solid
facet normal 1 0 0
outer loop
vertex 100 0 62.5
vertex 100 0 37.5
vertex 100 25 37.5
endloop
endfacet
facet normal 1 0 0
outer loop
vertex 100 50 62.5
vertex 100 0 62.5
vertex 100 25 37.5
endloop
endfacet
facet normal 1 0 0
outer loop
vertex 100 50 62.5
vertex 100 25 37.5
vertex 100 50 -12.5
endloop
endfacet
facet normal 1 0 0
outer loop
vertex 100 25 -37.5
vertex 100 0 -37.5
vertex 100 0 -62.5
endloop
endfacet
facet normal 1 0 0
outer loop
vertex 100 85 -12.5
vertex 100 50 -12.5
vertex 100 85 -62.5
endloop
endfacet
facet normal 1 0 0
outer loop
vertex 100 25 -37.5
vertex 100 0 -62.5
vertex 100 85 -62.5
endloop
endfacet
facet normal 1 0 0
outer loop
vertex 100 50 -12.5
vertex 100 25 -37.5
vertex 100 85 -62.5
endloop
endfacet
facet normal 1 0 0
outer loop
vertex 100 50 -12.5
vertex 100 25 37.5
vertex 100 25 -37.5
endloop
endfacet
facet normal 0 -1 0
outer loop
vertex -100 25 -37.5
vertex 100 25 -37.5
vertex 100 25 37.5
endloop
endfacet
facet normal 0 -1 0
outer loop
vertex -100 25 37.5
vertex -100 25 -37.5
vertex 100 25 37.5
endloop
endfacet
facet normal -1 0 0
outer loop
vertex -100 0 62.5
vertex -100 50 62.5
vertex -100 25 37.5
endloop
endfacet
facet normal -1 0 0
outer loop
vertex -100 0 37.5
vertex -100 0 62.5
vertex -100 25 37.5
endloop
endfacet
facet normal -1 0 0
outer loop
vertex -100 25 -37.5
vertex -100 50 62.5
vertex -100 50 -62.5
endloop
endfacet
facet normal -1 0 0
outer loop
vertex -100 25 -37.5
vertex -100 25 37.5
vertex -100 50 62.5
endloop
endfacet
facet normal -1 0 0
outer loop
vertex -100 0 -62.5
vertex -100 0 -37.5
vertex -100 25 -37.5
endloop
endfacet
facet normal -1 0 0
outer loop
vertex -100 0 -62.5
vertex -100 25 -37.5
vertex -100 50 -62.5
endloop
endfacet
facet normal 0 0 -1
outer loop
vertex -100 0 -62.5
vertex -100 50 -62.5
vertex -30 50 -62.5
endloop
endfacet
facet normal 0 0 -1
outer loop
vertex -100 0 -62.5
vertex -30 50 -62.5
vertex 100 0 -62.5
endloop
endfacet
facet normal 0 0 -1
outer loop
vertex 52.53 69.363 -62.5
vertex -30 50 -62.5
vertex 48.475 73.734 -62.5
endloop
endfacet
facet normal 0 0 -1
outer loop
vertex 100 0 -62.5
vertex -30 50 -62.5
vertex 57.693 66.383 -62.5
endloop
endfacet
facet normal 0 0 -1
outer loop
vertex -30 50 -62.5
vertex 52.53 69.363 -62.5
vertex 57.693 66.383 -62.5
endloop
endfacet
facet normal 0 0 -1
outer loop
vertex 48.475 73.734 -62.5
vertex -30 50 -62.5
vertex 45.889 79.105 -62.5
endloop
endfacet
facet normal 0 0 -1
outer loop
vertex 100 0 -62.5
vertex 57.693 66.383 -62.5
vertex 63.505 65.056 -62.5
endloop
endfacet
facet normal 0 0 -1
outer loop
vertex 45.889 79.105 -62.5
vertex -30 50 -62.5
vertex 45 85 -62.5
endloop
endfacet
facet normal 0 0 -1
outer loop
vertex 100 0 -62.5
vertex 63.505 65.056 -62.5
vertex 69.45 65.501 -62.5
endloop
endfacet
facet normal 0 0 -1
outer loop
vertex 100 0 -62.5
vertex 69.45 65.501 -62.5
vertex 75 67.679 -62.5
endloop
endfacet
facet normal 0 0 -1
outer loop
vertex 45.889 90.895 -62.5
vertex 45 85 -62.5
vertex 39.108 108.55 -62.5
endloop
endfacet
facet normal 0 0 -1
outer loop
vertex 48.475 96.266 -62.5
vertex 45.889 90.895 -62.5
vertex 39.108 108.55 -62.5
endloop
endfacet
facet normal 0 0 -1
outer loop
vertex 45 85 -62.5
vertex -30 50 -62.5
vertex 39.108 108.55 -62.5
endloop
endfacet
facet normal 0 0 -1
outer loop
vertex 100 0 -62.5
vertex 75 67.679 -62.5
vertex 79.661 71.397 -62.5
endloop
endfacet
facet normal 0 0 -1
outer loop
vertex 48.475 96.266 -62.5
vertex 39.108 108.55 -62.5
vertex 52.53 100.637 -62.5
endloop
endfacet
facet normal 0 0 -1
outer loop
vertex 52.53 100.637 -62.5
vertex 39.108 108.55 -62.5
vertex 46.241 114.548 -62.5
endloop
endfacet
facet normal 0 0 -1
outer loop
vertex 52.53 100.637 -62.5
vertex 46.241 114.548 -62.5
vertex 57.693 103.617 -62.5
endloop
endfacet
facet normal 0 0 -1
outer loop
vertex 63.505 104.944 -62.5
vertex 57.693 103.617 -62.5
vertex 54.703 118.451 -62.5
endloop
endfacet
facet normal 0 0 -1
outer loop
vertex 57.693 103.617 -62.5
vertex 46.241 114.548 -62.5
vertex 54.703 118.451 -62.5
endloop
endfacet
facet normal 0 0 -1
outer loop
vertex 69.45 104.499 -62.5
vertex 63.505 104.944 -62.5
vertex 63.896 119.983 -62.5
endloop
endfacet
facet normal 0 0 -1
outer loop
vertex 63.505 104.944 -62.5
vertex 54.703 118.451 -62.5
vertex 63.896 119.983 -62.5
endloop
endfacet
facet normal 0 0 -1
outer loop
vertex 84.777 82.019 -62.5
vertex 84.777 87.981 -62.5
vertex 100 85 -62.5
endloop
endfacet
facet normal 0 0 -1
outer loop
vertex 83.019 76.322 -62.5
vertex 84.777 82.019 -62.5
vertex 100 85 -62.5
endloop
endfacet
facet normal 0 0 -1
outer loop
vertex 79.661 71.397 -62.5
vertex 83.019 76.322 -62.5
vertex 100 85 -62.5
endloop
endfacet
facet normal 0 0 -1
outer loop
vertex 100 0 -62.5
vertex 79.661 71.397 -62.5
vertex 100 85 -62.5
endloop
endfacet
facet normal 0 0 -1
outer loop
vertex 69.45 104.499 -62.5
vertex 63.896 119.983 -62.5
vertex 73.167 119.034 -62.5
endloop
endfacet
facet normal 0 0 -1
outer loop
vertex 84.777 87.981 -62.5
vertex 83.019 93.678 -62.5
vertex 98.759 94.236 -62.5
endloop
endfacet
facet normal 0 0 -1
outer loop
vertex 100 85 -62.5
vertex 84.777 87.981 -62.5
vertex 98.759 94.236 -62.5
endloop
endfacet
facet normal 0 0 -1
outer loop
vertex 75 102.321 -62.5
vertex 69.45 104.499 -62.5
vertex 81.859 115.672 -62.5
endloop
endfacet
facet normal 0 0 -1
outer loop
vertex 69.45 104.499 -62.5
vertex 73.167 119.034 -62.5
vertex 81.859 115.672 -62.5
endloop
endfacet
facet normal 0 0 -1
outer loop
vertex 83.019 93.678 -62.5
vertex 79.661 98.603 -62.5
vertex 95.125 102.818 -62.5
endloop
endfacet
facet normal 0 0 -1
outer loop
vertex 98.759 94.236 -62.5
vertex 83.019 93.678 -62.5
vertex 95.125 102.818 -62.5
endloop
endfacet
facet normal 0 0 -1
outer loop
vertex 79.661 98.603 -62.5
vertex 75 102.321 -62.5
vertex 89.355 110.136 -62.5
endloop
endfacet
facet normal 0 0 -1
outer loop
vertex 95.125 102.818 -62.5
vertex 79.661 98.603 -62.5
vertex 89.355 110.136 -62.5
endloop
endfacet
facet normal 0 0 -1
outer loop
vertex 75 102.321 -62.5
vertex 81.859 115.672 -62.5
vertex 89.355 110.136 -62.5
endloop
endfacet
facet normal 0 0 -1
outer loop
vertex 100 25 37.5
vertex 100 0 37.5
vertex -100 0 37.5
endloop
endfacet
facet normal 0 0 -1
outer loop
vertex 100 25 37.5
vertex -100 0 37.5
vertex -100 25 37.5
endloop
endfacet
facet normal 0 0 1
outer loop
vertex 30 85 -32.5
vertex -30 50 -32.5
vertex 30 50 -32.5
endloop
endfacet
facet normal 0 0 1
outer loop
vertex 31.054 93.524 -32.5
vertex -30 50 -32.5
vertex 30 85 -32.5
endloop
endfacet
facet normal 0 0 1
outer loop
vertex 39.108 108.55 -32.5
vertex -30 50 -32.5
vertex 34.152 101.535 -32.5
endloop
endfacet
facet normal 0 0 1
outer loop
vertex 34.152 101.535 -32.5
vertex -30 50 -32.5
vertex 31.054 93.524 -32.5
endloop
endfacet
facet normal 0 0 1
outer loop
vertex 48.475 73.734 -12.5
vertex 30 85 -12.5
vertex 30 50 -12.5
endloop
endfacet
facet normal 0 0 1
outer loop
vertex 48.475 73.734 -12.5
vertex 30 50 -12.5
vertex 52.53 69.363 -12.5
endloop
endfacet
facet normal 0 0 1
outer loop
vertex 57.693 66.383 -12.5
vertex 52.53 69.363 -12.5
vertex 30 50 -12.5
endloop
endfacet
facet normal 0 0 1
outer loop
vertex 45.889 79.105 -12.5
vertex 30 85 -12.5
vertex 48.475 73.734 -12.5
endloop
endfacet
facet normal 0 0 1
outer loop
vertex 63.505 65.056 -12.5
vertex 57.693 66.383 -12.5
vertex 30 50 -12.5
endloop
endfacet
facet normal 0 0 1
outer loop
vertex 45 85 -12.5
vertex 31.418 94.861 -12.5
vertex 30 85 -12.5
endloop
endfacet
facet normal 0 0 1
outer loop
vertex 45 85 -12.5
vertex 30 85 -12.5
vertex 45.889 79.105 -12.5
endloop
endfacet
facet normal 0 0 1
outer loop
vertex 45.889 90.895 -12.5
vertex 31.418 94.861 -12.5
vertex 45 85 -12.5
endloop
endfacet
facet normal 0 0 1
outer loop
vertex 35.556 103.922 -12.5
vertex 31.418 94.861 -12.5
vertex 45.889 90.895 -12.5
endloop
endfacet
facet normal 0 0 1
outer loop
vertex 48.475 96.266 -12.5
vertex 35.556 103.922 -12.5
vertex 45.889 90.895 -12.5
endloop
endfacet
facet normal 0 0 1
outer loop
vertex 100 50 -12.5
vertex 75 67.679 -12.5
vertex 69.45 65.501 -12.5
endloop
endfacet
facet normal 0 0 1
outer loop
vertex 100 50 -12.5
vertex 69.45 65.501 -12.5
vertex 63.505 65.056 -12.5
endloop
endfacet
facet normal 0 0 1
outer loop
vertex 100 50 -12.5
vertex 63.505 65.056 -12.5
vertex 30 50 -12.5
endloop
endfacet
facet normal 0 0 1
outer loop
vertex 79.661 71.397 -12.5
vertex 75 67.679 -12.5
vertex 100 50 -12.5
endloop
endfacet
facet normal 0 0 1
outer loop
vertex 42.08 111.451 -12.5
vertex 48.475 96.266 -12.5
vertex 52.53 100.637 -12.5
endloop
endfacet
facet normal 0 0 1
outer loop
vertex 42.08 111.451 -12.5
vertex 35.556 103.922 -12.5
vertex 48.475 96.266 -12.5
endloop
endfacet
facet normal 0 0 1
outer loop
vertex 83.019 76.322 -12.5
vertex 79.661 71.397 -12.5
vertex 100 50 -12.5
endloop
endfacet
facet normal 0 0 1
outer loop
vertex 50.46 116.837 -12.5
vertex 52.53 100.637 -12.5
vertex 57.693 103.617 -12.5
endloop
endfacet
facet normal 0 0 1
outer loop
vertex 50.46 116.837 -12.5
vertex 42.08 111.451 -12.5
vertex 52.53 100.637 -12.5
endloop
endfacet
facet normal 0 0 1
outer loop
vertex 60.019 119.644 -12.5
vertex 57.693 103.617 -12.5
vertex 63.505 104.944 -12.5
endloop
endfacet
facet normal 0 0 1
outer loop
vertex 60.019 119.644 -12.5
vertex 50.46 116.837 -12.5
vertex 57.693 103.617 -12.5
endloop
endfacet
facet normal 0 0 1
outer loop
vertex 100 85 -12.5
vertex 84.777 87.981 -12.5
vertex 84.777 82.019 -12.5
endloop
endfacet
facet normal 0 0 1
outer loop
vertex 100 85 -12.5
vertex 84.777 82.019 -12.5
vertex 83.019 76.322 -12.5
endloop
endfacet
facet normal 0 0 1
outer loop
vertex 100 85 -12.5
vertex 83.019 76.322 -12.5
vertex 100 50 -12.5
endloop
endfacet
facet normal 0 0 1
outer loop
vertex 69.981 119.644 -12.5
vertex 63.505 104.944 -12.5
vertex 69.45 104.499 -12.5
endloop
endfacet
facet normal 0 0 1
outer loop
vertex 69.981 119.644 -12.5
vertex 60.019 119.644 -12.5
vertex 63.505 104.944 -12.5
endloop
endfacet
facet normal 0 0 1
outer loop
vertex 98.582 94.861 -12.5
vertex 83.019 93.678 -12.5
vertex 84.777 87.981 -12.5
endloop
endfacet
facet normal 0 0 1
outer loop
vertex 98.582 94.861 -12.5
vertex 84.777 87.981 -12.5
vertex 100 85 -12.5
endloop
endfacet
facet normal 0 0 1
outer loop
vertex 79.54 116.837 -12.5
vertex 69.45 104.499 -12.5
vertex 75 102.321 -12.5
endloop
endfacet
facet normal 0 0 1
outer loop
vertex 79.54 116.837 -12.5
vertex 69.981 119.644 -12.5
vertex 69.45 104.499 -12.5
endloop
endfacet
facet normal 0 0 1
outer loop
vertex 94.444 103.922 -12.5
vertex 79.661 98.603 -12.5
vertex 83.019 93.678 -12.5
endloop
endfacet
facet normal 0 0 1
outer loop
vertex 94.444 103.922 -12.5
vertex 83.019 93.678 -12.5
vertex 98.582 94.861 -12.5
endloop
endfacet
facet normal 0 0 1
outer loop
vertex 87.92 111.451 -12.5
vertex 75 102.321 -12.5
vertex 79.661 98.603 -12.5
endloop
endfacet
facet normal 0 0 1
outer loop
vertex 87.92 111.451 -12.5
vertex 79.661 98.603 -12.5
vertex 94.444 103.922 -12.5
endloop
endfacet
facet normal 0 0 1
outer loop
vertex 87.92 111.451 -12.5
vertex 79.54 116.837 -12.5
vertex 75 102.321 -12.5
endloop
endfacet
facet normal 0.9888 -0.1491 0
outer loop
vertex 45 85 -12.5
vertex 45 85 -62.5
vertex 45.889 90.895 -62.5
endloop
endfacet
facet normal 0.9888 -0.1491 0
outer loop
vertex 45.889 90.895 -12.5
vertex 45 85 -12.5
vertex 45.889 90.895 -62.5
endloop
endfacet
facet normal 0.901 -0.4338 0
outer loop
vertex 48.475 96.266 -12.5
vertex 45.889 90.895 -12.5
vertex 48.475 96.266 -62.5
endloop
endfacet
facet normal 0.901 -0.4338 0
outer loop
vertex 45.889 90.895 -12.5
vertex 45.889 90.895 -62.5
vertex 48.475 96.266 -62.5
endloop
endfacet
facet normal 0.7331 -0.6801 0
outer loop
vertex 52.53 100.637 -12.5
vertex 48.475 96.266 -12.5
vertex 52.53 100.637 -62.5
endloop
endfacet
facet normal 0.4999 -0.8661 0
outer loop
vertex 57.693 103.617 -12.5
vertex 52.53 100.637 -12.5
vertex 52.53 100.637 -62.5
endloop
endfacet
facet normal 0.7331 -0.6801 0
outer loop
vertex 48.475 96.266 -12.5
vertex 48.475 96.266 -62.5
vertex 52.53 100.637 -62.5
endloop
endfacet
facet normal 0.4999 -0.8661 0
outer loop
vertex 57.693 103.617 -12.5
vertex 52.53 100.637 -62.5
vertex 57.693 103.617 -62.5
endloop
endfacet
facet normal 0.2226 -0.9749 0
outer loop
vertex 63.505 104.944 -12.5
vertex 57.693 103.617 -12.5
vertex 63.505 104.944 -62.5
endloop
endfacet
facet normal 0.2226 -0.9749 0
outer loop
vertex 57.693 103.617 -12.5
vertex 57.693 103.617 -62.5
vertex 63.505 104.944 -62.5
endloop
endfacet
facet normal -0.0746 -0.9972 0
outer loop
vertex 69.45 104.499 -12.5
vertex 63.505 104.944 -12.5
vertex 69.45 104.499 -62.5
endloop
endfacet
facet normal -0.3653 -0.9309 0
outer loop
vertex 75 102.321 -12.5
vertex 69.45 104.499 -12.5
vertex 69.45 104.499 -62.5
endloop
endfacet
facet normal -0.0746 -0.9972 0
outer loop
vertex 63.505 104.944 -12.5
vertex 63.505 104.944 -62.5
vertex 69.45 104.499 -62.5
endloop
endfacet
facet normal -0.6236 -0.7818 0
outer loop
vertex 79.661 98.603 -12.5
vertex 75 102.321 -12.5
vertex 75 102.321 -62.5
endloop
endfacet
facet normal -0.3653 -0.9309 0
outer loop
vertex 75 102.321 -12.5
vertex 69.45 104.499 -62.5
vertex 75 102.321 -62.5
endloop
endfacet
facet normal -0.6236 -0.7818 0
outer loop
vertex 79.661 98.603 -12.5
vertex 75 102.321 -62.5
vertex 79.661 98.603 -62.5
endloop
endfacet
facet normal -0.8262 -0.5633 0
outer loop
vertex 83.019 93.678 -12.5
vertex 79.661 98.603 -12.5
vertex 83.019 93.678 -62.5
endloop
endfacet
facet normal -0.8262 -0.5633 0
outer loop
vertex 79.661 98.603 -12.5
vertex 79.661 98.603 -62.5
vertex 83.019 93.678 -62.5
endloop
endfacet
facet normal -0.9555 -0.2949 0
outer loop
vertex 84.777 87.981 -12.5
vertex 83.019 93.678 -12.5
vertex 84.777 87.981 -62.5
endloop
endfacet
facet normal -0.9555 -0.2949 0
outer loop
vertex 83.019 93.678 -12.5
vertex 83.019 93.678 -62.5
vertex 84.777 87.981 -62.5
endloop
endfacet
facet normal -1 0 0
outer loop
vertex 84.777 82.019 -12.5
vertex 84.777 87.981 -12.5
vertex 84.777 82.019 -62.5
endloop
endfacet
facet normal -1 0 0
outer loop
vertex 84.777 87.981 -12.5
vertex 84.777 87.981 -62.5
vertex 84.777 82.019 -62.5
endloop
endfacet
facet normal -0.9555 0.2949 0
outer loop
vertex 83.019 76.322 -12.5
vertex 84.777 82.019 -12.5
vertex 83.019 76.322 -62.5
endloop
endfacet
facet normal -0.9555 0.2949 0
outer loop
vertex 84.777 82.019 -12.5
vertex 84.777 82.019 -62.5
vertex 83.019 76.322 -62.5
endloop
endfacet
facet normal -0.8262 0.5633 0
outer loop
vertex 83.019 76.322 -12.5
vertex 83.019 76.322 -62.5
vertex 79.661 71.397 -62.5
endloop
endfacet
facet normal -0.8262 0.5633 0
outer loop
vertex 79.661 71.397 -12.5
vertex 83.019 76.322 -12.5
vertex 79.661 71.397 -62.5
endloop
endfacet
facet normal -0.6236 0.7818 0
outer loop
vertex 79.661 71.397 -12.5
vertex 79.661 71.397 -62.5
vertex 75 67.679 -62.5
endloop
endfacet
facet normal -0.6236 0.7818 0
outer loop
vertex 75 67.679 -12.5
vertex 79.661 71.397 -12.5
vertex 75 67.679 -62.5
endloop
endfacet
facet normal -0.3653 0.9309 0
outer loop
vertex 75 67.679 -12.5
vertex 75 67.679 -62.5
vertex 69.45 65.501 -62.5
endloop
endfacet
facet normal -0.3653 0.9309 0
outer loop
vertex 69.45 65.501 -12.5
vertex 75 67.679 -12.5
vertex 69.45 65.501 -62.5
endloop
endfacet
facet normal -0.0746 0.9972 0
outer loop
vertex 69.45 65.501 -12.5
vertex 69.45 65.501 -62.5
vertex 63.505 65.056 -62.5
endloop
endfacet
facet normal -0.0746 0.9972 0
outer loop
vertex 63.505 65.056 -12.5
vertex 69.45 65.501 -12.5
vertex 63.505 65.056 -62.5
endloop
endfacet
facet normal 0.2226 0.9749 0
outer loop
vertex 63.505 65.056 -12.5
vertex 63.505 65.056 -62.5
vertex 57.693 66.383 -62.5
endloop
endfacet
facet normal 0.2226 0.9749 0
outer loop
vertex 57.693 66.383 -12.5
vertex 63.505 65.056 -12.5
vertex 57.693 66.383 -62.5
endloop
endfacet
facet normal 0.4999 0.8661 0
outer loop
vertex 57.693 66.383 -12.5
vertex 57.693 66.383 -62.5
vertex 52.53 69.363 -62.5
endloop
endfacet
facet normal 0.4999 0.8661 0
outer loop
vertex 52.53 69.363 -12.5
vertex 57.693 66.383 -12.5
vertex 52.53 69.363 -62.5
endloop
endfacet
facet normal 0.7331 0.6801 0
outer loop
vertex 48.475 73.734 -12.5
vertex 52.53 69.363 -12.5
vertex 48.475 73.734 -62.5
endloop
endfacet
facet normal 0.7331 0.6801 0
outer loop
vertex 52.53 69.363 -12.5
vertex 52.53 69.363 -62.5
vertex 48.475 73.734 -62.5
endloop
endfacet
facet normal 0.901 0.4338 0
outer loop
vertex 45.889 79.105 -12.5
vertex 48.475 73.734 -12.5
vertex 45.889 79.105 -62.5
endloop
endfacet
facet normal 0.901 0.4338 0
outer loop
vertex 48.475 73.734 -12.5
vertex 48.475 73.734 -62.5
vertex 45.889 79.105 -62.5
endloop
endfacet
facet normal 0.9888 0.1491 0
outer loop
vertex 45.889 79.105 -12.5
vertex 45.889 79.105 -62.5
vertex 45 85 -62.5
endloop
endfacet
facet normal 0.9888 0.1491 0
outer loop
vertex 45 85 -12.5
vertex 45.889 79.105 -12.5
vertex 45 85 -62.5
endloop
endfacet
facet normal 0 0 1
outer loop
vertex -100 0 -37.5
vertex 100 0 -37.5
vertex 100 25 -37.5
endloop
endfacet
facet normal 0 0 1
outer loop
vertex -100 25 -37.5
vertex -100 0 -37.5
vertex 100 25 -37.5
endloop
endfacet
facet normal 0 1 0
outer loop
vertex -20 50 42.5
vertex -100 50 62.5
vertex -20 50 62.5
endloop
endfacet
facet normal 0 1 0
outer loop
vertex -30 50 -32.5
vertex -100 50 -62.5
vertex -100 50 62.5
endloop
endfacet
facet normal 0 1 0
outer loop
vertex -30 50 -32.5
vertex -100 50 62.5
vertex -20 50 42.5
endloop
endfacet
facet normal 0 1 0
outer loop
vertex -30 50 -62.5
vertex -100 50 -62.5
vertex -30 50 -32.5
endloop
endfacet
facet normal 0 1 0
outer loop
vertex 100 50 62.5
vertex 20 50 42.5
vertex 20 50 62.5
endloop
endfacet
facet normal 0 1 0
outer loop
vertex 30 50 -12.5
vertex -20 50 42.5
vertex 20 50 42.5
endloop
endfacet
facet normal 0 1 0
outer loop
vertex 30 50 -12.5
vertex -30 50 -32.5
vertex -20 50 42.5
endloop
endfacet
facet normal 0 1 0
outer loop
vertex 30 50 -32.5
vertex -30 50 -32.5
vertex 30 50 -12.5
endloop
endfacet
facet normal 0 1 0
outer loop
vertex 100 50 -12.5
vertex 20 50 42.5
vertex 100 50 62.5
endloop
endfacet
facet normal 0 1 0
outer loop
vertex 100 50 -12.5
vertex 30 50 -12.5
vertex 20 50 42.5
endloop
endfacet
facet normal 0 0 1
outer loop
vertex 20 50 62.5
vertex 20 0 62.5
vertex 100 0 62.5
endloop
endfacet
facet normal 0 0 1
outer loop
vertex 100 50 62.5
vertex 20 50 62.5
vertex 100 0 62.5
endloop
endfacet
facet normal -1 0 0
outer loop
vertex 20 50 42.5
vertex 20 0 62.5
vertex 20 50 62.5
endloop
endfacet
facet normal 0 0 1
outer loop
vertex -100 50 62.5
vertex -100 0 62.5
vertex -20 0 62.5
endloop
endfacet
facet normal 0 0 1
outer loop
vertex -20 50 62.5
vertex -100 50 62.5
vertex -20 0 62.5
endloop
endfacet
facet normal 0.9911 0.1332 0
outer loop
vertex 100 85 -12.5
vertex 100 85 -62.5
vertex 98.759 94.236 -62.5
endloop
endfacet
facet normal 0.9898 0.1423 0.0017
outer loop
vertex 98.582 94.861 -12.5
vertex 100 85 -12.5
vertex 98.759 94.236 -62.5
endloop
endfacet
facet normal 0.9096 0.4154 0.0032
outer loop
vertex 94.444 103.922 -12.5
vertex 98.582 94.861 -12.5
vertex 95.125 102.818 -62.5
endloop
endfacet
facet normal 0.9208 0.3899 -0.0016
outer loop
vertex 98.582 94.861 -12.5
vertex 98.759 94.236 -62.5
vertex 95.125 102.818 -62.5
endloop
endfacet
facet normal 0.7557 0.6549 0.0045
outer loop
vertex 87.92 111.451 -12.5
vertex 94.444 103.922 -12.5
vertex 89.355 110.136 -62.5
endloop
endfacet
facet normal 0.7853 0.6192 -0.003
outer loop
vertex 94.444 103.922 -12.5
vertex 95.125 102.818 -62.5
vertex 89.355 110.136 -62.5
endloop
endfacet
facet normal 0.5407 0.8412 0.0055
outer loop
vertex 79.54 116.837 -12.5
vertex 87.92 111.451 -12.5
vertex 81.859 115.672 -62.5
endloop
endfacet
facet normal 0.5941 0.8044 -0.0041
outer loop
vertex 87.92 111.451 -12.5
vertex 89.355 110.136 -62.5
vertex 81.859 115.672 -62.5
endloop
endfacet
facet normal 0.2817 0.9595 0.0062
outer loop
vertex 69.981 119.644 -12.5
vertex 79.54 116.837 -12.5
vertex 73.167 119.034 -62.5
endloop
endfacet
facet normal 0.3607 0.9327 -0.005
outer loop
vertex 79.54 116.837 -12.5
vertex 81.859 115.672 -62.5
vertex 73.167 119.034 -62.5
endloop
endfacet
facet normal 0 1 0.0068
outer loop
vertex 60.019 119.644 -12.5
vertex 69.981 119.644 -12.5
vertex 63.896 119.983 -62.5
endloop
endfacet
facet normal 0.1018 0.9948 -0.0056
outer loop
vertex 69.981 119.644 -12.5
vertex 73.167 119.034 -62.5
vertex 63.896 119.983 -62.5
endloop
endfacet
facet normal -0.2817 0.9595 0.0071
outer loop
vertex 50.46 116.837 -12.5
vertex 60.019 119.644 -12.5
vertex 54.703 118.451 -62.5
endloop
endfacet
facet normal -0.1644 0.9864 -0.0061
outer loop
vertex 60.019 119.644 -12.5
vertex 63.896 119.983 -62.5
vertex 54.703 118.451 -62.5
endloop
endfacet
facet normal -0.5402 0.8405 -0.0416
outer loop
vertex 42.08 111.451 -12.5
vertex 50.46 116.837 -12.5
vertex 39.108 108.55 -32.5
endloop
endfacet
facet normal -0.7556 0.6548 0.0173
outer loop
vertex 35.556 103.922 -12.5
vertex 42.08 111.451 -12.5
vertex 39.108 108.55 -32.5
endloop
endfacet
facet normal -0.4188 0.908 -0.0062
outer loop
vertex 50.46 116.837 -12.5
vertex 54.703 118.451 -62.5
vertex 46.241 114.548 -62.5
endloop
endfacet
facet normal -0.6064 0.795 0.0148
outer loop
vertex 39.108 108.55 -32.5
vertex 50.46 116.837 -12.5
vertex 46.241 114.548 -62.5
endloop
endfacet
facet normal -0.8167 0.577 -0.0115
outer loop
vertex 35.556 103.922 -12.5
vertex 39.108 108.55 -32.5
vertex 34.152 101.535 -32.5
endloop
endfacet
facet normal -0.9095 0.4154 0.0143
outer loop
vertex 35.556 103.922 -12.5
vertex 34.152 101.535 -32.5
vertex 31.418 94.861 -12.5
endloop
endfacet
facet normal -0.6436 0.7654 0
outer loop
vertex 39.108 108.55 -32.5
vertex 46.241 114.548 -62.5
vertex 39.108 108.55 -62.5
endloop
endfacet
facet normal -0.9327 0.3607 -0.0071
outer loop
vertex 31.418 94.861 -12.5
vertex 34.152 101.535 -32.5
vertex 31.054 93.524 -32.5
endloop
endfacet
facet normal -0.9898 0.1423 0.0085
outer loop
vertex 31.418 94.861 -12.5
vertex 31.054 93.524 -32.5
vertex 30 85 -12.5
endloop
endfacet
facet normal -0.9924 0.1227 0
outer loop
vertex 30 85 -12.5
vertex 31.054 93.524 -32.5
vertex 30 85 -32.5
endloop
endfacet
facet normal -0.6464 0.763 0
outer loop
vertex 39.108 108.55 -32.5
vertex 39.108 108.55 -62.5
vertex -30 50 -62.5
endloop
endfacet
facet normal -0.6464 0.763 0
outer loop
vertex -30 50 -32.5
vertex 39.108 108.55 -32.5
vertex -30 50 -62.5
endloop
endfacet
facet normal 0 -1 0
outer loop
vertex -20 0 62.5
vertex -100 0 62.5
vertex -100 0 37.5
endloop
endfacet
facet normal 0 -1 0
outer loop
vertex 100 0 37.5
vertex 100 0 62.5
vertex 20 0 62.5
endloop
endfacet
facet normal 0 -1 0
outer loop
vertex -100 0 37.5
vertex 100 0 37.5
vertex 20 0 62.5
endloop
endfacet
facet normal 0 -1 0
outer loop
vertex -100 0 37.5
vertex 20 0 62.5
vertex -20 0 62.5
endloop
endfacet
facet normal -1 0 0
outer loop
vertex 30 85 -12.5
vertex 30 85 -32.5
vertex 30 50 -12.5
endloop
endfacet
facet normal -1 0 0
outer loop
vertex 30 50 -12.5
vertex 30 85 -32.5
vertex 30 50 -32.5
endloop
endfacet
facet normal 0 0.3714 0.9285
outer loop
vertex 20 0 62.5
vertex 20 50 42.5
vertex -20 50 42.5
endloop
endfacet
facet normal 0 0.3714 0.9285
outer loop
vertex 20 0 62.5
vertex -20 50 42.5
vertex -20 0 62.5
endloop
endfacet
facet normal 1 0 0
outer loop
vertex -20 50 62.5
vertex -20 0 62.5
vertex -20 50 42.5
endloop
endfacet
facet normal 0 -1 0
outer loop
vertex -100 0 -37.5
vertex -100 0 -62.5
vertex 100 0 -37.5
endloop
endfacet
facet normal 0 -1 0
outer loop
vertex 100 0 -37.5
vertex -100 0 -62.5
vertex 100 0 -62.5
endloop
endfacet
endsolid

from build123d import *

# Parameters (mm, degrees)
SKETCH1_W           = 200
SKETCH1_H           = 125
BOSS_EXTRUDE2_DEPTH = 50
SKETCH3_R           = 20
BOSS_EXTRUDE5_DEPTH = 50
SKETCH6_W           = 75
SKETCH6_H           = 25
CUT_EXTRUDE1_DEPTH  = 242.466871434
BOSS_EXTRUDE6_DEPTH = 30
SKETCH8_W           = 40
SKETCH8_H           = 50
CUT_EXTRUDE2_DEPTH  = 20
BOSS_EXTRUDE7_DEPTH = 40


with BuildPart() as part:
    # Sketch1 → Boss-Extrude2 (new body)
    with BuildSketch(Plane(origin=(0, 0, 0), x_dir=(1, 0, 0), z_dir=(0, 1, 0))):
        Rectangle(SKETCH1_W, SKETCH1_H)
    extrude(amount=BOSS_EXTRUDE2_DEPTH)

    # Sketch3 → Boss-Extrude5 (add)
    with BuildSketch(Plane(origin=(0, 0, -62.5), x_dir=(-1, 0, 0), z_dir=(0, 0, -1))):
        with BuildLine():
            Line((-100, 50), (-100, 85))
            ThreePointArc((-100, 85), (-65, 120), (-30, 85))
            Line((-30, 85), (-30, 50))
            Line((-30, 50), (-100, 50))
        make_face()
        with Locations((-65, 85)):
            Circle(SKETCH3_R, mode=Mode.SUBTRACT)
    extrude(amount=-BOSS_EXTRUDE5_DEPTH)

    # Sketch6 → Cut-Extrude1 (cut, through all)
    with BuildSketch(Plane.ZY.offset(100)):
        with Locations((0, 12.5)):
            Rectangle(SKETCH6_W, SKETCH6_H)
    extrude(amount=-CUT_EXTRUDE1_DEPTH, mode=Mode.SUBTRACT)

    # Sketch7 → Boss-Extrude6 (add)
    with BuildSketch(Plane(origin=(0, 0, -62.5), x_dir=(-1, 0, 0), z_dir=(0, 0, -1))):
        with BuildLine():
            Line((-39.10827581, 108.550342215), (30, 50))
            Line((30, 50), (-30, 50))
            Line((-30, 50), (-30, 85))
            ThreePointArc((-30, 85), (-32.356391539, 97.625166402), (-39.10827581, 108.550342215))
        make_face()
    extrude(amount=-BOSS_EXTRUDE6_DEPTH)

    # Sketch8 → Cut-Extrude2 (cut)
    with BuildSketch(Plane.XY.offset(62.5)):
        with Locations((0, 25)):
            Rectangle(SKETCH8_W, SKETCH8_H)
    extrude(amount=-CUT_EXTRUDE2_DEPTH, mode=Mode.SUBTRACT)

    # Sketch9 → Boss-Extrude7 (add)
    with BuildSketch(Plane.ZY.offset(-20)):
        Polygon((42.5, 50), (62.5, 0), (42.5, 0), align=None)
    extrude(amount=BOSS_EXTRUDE7_DEPTH)


solid = part.part
